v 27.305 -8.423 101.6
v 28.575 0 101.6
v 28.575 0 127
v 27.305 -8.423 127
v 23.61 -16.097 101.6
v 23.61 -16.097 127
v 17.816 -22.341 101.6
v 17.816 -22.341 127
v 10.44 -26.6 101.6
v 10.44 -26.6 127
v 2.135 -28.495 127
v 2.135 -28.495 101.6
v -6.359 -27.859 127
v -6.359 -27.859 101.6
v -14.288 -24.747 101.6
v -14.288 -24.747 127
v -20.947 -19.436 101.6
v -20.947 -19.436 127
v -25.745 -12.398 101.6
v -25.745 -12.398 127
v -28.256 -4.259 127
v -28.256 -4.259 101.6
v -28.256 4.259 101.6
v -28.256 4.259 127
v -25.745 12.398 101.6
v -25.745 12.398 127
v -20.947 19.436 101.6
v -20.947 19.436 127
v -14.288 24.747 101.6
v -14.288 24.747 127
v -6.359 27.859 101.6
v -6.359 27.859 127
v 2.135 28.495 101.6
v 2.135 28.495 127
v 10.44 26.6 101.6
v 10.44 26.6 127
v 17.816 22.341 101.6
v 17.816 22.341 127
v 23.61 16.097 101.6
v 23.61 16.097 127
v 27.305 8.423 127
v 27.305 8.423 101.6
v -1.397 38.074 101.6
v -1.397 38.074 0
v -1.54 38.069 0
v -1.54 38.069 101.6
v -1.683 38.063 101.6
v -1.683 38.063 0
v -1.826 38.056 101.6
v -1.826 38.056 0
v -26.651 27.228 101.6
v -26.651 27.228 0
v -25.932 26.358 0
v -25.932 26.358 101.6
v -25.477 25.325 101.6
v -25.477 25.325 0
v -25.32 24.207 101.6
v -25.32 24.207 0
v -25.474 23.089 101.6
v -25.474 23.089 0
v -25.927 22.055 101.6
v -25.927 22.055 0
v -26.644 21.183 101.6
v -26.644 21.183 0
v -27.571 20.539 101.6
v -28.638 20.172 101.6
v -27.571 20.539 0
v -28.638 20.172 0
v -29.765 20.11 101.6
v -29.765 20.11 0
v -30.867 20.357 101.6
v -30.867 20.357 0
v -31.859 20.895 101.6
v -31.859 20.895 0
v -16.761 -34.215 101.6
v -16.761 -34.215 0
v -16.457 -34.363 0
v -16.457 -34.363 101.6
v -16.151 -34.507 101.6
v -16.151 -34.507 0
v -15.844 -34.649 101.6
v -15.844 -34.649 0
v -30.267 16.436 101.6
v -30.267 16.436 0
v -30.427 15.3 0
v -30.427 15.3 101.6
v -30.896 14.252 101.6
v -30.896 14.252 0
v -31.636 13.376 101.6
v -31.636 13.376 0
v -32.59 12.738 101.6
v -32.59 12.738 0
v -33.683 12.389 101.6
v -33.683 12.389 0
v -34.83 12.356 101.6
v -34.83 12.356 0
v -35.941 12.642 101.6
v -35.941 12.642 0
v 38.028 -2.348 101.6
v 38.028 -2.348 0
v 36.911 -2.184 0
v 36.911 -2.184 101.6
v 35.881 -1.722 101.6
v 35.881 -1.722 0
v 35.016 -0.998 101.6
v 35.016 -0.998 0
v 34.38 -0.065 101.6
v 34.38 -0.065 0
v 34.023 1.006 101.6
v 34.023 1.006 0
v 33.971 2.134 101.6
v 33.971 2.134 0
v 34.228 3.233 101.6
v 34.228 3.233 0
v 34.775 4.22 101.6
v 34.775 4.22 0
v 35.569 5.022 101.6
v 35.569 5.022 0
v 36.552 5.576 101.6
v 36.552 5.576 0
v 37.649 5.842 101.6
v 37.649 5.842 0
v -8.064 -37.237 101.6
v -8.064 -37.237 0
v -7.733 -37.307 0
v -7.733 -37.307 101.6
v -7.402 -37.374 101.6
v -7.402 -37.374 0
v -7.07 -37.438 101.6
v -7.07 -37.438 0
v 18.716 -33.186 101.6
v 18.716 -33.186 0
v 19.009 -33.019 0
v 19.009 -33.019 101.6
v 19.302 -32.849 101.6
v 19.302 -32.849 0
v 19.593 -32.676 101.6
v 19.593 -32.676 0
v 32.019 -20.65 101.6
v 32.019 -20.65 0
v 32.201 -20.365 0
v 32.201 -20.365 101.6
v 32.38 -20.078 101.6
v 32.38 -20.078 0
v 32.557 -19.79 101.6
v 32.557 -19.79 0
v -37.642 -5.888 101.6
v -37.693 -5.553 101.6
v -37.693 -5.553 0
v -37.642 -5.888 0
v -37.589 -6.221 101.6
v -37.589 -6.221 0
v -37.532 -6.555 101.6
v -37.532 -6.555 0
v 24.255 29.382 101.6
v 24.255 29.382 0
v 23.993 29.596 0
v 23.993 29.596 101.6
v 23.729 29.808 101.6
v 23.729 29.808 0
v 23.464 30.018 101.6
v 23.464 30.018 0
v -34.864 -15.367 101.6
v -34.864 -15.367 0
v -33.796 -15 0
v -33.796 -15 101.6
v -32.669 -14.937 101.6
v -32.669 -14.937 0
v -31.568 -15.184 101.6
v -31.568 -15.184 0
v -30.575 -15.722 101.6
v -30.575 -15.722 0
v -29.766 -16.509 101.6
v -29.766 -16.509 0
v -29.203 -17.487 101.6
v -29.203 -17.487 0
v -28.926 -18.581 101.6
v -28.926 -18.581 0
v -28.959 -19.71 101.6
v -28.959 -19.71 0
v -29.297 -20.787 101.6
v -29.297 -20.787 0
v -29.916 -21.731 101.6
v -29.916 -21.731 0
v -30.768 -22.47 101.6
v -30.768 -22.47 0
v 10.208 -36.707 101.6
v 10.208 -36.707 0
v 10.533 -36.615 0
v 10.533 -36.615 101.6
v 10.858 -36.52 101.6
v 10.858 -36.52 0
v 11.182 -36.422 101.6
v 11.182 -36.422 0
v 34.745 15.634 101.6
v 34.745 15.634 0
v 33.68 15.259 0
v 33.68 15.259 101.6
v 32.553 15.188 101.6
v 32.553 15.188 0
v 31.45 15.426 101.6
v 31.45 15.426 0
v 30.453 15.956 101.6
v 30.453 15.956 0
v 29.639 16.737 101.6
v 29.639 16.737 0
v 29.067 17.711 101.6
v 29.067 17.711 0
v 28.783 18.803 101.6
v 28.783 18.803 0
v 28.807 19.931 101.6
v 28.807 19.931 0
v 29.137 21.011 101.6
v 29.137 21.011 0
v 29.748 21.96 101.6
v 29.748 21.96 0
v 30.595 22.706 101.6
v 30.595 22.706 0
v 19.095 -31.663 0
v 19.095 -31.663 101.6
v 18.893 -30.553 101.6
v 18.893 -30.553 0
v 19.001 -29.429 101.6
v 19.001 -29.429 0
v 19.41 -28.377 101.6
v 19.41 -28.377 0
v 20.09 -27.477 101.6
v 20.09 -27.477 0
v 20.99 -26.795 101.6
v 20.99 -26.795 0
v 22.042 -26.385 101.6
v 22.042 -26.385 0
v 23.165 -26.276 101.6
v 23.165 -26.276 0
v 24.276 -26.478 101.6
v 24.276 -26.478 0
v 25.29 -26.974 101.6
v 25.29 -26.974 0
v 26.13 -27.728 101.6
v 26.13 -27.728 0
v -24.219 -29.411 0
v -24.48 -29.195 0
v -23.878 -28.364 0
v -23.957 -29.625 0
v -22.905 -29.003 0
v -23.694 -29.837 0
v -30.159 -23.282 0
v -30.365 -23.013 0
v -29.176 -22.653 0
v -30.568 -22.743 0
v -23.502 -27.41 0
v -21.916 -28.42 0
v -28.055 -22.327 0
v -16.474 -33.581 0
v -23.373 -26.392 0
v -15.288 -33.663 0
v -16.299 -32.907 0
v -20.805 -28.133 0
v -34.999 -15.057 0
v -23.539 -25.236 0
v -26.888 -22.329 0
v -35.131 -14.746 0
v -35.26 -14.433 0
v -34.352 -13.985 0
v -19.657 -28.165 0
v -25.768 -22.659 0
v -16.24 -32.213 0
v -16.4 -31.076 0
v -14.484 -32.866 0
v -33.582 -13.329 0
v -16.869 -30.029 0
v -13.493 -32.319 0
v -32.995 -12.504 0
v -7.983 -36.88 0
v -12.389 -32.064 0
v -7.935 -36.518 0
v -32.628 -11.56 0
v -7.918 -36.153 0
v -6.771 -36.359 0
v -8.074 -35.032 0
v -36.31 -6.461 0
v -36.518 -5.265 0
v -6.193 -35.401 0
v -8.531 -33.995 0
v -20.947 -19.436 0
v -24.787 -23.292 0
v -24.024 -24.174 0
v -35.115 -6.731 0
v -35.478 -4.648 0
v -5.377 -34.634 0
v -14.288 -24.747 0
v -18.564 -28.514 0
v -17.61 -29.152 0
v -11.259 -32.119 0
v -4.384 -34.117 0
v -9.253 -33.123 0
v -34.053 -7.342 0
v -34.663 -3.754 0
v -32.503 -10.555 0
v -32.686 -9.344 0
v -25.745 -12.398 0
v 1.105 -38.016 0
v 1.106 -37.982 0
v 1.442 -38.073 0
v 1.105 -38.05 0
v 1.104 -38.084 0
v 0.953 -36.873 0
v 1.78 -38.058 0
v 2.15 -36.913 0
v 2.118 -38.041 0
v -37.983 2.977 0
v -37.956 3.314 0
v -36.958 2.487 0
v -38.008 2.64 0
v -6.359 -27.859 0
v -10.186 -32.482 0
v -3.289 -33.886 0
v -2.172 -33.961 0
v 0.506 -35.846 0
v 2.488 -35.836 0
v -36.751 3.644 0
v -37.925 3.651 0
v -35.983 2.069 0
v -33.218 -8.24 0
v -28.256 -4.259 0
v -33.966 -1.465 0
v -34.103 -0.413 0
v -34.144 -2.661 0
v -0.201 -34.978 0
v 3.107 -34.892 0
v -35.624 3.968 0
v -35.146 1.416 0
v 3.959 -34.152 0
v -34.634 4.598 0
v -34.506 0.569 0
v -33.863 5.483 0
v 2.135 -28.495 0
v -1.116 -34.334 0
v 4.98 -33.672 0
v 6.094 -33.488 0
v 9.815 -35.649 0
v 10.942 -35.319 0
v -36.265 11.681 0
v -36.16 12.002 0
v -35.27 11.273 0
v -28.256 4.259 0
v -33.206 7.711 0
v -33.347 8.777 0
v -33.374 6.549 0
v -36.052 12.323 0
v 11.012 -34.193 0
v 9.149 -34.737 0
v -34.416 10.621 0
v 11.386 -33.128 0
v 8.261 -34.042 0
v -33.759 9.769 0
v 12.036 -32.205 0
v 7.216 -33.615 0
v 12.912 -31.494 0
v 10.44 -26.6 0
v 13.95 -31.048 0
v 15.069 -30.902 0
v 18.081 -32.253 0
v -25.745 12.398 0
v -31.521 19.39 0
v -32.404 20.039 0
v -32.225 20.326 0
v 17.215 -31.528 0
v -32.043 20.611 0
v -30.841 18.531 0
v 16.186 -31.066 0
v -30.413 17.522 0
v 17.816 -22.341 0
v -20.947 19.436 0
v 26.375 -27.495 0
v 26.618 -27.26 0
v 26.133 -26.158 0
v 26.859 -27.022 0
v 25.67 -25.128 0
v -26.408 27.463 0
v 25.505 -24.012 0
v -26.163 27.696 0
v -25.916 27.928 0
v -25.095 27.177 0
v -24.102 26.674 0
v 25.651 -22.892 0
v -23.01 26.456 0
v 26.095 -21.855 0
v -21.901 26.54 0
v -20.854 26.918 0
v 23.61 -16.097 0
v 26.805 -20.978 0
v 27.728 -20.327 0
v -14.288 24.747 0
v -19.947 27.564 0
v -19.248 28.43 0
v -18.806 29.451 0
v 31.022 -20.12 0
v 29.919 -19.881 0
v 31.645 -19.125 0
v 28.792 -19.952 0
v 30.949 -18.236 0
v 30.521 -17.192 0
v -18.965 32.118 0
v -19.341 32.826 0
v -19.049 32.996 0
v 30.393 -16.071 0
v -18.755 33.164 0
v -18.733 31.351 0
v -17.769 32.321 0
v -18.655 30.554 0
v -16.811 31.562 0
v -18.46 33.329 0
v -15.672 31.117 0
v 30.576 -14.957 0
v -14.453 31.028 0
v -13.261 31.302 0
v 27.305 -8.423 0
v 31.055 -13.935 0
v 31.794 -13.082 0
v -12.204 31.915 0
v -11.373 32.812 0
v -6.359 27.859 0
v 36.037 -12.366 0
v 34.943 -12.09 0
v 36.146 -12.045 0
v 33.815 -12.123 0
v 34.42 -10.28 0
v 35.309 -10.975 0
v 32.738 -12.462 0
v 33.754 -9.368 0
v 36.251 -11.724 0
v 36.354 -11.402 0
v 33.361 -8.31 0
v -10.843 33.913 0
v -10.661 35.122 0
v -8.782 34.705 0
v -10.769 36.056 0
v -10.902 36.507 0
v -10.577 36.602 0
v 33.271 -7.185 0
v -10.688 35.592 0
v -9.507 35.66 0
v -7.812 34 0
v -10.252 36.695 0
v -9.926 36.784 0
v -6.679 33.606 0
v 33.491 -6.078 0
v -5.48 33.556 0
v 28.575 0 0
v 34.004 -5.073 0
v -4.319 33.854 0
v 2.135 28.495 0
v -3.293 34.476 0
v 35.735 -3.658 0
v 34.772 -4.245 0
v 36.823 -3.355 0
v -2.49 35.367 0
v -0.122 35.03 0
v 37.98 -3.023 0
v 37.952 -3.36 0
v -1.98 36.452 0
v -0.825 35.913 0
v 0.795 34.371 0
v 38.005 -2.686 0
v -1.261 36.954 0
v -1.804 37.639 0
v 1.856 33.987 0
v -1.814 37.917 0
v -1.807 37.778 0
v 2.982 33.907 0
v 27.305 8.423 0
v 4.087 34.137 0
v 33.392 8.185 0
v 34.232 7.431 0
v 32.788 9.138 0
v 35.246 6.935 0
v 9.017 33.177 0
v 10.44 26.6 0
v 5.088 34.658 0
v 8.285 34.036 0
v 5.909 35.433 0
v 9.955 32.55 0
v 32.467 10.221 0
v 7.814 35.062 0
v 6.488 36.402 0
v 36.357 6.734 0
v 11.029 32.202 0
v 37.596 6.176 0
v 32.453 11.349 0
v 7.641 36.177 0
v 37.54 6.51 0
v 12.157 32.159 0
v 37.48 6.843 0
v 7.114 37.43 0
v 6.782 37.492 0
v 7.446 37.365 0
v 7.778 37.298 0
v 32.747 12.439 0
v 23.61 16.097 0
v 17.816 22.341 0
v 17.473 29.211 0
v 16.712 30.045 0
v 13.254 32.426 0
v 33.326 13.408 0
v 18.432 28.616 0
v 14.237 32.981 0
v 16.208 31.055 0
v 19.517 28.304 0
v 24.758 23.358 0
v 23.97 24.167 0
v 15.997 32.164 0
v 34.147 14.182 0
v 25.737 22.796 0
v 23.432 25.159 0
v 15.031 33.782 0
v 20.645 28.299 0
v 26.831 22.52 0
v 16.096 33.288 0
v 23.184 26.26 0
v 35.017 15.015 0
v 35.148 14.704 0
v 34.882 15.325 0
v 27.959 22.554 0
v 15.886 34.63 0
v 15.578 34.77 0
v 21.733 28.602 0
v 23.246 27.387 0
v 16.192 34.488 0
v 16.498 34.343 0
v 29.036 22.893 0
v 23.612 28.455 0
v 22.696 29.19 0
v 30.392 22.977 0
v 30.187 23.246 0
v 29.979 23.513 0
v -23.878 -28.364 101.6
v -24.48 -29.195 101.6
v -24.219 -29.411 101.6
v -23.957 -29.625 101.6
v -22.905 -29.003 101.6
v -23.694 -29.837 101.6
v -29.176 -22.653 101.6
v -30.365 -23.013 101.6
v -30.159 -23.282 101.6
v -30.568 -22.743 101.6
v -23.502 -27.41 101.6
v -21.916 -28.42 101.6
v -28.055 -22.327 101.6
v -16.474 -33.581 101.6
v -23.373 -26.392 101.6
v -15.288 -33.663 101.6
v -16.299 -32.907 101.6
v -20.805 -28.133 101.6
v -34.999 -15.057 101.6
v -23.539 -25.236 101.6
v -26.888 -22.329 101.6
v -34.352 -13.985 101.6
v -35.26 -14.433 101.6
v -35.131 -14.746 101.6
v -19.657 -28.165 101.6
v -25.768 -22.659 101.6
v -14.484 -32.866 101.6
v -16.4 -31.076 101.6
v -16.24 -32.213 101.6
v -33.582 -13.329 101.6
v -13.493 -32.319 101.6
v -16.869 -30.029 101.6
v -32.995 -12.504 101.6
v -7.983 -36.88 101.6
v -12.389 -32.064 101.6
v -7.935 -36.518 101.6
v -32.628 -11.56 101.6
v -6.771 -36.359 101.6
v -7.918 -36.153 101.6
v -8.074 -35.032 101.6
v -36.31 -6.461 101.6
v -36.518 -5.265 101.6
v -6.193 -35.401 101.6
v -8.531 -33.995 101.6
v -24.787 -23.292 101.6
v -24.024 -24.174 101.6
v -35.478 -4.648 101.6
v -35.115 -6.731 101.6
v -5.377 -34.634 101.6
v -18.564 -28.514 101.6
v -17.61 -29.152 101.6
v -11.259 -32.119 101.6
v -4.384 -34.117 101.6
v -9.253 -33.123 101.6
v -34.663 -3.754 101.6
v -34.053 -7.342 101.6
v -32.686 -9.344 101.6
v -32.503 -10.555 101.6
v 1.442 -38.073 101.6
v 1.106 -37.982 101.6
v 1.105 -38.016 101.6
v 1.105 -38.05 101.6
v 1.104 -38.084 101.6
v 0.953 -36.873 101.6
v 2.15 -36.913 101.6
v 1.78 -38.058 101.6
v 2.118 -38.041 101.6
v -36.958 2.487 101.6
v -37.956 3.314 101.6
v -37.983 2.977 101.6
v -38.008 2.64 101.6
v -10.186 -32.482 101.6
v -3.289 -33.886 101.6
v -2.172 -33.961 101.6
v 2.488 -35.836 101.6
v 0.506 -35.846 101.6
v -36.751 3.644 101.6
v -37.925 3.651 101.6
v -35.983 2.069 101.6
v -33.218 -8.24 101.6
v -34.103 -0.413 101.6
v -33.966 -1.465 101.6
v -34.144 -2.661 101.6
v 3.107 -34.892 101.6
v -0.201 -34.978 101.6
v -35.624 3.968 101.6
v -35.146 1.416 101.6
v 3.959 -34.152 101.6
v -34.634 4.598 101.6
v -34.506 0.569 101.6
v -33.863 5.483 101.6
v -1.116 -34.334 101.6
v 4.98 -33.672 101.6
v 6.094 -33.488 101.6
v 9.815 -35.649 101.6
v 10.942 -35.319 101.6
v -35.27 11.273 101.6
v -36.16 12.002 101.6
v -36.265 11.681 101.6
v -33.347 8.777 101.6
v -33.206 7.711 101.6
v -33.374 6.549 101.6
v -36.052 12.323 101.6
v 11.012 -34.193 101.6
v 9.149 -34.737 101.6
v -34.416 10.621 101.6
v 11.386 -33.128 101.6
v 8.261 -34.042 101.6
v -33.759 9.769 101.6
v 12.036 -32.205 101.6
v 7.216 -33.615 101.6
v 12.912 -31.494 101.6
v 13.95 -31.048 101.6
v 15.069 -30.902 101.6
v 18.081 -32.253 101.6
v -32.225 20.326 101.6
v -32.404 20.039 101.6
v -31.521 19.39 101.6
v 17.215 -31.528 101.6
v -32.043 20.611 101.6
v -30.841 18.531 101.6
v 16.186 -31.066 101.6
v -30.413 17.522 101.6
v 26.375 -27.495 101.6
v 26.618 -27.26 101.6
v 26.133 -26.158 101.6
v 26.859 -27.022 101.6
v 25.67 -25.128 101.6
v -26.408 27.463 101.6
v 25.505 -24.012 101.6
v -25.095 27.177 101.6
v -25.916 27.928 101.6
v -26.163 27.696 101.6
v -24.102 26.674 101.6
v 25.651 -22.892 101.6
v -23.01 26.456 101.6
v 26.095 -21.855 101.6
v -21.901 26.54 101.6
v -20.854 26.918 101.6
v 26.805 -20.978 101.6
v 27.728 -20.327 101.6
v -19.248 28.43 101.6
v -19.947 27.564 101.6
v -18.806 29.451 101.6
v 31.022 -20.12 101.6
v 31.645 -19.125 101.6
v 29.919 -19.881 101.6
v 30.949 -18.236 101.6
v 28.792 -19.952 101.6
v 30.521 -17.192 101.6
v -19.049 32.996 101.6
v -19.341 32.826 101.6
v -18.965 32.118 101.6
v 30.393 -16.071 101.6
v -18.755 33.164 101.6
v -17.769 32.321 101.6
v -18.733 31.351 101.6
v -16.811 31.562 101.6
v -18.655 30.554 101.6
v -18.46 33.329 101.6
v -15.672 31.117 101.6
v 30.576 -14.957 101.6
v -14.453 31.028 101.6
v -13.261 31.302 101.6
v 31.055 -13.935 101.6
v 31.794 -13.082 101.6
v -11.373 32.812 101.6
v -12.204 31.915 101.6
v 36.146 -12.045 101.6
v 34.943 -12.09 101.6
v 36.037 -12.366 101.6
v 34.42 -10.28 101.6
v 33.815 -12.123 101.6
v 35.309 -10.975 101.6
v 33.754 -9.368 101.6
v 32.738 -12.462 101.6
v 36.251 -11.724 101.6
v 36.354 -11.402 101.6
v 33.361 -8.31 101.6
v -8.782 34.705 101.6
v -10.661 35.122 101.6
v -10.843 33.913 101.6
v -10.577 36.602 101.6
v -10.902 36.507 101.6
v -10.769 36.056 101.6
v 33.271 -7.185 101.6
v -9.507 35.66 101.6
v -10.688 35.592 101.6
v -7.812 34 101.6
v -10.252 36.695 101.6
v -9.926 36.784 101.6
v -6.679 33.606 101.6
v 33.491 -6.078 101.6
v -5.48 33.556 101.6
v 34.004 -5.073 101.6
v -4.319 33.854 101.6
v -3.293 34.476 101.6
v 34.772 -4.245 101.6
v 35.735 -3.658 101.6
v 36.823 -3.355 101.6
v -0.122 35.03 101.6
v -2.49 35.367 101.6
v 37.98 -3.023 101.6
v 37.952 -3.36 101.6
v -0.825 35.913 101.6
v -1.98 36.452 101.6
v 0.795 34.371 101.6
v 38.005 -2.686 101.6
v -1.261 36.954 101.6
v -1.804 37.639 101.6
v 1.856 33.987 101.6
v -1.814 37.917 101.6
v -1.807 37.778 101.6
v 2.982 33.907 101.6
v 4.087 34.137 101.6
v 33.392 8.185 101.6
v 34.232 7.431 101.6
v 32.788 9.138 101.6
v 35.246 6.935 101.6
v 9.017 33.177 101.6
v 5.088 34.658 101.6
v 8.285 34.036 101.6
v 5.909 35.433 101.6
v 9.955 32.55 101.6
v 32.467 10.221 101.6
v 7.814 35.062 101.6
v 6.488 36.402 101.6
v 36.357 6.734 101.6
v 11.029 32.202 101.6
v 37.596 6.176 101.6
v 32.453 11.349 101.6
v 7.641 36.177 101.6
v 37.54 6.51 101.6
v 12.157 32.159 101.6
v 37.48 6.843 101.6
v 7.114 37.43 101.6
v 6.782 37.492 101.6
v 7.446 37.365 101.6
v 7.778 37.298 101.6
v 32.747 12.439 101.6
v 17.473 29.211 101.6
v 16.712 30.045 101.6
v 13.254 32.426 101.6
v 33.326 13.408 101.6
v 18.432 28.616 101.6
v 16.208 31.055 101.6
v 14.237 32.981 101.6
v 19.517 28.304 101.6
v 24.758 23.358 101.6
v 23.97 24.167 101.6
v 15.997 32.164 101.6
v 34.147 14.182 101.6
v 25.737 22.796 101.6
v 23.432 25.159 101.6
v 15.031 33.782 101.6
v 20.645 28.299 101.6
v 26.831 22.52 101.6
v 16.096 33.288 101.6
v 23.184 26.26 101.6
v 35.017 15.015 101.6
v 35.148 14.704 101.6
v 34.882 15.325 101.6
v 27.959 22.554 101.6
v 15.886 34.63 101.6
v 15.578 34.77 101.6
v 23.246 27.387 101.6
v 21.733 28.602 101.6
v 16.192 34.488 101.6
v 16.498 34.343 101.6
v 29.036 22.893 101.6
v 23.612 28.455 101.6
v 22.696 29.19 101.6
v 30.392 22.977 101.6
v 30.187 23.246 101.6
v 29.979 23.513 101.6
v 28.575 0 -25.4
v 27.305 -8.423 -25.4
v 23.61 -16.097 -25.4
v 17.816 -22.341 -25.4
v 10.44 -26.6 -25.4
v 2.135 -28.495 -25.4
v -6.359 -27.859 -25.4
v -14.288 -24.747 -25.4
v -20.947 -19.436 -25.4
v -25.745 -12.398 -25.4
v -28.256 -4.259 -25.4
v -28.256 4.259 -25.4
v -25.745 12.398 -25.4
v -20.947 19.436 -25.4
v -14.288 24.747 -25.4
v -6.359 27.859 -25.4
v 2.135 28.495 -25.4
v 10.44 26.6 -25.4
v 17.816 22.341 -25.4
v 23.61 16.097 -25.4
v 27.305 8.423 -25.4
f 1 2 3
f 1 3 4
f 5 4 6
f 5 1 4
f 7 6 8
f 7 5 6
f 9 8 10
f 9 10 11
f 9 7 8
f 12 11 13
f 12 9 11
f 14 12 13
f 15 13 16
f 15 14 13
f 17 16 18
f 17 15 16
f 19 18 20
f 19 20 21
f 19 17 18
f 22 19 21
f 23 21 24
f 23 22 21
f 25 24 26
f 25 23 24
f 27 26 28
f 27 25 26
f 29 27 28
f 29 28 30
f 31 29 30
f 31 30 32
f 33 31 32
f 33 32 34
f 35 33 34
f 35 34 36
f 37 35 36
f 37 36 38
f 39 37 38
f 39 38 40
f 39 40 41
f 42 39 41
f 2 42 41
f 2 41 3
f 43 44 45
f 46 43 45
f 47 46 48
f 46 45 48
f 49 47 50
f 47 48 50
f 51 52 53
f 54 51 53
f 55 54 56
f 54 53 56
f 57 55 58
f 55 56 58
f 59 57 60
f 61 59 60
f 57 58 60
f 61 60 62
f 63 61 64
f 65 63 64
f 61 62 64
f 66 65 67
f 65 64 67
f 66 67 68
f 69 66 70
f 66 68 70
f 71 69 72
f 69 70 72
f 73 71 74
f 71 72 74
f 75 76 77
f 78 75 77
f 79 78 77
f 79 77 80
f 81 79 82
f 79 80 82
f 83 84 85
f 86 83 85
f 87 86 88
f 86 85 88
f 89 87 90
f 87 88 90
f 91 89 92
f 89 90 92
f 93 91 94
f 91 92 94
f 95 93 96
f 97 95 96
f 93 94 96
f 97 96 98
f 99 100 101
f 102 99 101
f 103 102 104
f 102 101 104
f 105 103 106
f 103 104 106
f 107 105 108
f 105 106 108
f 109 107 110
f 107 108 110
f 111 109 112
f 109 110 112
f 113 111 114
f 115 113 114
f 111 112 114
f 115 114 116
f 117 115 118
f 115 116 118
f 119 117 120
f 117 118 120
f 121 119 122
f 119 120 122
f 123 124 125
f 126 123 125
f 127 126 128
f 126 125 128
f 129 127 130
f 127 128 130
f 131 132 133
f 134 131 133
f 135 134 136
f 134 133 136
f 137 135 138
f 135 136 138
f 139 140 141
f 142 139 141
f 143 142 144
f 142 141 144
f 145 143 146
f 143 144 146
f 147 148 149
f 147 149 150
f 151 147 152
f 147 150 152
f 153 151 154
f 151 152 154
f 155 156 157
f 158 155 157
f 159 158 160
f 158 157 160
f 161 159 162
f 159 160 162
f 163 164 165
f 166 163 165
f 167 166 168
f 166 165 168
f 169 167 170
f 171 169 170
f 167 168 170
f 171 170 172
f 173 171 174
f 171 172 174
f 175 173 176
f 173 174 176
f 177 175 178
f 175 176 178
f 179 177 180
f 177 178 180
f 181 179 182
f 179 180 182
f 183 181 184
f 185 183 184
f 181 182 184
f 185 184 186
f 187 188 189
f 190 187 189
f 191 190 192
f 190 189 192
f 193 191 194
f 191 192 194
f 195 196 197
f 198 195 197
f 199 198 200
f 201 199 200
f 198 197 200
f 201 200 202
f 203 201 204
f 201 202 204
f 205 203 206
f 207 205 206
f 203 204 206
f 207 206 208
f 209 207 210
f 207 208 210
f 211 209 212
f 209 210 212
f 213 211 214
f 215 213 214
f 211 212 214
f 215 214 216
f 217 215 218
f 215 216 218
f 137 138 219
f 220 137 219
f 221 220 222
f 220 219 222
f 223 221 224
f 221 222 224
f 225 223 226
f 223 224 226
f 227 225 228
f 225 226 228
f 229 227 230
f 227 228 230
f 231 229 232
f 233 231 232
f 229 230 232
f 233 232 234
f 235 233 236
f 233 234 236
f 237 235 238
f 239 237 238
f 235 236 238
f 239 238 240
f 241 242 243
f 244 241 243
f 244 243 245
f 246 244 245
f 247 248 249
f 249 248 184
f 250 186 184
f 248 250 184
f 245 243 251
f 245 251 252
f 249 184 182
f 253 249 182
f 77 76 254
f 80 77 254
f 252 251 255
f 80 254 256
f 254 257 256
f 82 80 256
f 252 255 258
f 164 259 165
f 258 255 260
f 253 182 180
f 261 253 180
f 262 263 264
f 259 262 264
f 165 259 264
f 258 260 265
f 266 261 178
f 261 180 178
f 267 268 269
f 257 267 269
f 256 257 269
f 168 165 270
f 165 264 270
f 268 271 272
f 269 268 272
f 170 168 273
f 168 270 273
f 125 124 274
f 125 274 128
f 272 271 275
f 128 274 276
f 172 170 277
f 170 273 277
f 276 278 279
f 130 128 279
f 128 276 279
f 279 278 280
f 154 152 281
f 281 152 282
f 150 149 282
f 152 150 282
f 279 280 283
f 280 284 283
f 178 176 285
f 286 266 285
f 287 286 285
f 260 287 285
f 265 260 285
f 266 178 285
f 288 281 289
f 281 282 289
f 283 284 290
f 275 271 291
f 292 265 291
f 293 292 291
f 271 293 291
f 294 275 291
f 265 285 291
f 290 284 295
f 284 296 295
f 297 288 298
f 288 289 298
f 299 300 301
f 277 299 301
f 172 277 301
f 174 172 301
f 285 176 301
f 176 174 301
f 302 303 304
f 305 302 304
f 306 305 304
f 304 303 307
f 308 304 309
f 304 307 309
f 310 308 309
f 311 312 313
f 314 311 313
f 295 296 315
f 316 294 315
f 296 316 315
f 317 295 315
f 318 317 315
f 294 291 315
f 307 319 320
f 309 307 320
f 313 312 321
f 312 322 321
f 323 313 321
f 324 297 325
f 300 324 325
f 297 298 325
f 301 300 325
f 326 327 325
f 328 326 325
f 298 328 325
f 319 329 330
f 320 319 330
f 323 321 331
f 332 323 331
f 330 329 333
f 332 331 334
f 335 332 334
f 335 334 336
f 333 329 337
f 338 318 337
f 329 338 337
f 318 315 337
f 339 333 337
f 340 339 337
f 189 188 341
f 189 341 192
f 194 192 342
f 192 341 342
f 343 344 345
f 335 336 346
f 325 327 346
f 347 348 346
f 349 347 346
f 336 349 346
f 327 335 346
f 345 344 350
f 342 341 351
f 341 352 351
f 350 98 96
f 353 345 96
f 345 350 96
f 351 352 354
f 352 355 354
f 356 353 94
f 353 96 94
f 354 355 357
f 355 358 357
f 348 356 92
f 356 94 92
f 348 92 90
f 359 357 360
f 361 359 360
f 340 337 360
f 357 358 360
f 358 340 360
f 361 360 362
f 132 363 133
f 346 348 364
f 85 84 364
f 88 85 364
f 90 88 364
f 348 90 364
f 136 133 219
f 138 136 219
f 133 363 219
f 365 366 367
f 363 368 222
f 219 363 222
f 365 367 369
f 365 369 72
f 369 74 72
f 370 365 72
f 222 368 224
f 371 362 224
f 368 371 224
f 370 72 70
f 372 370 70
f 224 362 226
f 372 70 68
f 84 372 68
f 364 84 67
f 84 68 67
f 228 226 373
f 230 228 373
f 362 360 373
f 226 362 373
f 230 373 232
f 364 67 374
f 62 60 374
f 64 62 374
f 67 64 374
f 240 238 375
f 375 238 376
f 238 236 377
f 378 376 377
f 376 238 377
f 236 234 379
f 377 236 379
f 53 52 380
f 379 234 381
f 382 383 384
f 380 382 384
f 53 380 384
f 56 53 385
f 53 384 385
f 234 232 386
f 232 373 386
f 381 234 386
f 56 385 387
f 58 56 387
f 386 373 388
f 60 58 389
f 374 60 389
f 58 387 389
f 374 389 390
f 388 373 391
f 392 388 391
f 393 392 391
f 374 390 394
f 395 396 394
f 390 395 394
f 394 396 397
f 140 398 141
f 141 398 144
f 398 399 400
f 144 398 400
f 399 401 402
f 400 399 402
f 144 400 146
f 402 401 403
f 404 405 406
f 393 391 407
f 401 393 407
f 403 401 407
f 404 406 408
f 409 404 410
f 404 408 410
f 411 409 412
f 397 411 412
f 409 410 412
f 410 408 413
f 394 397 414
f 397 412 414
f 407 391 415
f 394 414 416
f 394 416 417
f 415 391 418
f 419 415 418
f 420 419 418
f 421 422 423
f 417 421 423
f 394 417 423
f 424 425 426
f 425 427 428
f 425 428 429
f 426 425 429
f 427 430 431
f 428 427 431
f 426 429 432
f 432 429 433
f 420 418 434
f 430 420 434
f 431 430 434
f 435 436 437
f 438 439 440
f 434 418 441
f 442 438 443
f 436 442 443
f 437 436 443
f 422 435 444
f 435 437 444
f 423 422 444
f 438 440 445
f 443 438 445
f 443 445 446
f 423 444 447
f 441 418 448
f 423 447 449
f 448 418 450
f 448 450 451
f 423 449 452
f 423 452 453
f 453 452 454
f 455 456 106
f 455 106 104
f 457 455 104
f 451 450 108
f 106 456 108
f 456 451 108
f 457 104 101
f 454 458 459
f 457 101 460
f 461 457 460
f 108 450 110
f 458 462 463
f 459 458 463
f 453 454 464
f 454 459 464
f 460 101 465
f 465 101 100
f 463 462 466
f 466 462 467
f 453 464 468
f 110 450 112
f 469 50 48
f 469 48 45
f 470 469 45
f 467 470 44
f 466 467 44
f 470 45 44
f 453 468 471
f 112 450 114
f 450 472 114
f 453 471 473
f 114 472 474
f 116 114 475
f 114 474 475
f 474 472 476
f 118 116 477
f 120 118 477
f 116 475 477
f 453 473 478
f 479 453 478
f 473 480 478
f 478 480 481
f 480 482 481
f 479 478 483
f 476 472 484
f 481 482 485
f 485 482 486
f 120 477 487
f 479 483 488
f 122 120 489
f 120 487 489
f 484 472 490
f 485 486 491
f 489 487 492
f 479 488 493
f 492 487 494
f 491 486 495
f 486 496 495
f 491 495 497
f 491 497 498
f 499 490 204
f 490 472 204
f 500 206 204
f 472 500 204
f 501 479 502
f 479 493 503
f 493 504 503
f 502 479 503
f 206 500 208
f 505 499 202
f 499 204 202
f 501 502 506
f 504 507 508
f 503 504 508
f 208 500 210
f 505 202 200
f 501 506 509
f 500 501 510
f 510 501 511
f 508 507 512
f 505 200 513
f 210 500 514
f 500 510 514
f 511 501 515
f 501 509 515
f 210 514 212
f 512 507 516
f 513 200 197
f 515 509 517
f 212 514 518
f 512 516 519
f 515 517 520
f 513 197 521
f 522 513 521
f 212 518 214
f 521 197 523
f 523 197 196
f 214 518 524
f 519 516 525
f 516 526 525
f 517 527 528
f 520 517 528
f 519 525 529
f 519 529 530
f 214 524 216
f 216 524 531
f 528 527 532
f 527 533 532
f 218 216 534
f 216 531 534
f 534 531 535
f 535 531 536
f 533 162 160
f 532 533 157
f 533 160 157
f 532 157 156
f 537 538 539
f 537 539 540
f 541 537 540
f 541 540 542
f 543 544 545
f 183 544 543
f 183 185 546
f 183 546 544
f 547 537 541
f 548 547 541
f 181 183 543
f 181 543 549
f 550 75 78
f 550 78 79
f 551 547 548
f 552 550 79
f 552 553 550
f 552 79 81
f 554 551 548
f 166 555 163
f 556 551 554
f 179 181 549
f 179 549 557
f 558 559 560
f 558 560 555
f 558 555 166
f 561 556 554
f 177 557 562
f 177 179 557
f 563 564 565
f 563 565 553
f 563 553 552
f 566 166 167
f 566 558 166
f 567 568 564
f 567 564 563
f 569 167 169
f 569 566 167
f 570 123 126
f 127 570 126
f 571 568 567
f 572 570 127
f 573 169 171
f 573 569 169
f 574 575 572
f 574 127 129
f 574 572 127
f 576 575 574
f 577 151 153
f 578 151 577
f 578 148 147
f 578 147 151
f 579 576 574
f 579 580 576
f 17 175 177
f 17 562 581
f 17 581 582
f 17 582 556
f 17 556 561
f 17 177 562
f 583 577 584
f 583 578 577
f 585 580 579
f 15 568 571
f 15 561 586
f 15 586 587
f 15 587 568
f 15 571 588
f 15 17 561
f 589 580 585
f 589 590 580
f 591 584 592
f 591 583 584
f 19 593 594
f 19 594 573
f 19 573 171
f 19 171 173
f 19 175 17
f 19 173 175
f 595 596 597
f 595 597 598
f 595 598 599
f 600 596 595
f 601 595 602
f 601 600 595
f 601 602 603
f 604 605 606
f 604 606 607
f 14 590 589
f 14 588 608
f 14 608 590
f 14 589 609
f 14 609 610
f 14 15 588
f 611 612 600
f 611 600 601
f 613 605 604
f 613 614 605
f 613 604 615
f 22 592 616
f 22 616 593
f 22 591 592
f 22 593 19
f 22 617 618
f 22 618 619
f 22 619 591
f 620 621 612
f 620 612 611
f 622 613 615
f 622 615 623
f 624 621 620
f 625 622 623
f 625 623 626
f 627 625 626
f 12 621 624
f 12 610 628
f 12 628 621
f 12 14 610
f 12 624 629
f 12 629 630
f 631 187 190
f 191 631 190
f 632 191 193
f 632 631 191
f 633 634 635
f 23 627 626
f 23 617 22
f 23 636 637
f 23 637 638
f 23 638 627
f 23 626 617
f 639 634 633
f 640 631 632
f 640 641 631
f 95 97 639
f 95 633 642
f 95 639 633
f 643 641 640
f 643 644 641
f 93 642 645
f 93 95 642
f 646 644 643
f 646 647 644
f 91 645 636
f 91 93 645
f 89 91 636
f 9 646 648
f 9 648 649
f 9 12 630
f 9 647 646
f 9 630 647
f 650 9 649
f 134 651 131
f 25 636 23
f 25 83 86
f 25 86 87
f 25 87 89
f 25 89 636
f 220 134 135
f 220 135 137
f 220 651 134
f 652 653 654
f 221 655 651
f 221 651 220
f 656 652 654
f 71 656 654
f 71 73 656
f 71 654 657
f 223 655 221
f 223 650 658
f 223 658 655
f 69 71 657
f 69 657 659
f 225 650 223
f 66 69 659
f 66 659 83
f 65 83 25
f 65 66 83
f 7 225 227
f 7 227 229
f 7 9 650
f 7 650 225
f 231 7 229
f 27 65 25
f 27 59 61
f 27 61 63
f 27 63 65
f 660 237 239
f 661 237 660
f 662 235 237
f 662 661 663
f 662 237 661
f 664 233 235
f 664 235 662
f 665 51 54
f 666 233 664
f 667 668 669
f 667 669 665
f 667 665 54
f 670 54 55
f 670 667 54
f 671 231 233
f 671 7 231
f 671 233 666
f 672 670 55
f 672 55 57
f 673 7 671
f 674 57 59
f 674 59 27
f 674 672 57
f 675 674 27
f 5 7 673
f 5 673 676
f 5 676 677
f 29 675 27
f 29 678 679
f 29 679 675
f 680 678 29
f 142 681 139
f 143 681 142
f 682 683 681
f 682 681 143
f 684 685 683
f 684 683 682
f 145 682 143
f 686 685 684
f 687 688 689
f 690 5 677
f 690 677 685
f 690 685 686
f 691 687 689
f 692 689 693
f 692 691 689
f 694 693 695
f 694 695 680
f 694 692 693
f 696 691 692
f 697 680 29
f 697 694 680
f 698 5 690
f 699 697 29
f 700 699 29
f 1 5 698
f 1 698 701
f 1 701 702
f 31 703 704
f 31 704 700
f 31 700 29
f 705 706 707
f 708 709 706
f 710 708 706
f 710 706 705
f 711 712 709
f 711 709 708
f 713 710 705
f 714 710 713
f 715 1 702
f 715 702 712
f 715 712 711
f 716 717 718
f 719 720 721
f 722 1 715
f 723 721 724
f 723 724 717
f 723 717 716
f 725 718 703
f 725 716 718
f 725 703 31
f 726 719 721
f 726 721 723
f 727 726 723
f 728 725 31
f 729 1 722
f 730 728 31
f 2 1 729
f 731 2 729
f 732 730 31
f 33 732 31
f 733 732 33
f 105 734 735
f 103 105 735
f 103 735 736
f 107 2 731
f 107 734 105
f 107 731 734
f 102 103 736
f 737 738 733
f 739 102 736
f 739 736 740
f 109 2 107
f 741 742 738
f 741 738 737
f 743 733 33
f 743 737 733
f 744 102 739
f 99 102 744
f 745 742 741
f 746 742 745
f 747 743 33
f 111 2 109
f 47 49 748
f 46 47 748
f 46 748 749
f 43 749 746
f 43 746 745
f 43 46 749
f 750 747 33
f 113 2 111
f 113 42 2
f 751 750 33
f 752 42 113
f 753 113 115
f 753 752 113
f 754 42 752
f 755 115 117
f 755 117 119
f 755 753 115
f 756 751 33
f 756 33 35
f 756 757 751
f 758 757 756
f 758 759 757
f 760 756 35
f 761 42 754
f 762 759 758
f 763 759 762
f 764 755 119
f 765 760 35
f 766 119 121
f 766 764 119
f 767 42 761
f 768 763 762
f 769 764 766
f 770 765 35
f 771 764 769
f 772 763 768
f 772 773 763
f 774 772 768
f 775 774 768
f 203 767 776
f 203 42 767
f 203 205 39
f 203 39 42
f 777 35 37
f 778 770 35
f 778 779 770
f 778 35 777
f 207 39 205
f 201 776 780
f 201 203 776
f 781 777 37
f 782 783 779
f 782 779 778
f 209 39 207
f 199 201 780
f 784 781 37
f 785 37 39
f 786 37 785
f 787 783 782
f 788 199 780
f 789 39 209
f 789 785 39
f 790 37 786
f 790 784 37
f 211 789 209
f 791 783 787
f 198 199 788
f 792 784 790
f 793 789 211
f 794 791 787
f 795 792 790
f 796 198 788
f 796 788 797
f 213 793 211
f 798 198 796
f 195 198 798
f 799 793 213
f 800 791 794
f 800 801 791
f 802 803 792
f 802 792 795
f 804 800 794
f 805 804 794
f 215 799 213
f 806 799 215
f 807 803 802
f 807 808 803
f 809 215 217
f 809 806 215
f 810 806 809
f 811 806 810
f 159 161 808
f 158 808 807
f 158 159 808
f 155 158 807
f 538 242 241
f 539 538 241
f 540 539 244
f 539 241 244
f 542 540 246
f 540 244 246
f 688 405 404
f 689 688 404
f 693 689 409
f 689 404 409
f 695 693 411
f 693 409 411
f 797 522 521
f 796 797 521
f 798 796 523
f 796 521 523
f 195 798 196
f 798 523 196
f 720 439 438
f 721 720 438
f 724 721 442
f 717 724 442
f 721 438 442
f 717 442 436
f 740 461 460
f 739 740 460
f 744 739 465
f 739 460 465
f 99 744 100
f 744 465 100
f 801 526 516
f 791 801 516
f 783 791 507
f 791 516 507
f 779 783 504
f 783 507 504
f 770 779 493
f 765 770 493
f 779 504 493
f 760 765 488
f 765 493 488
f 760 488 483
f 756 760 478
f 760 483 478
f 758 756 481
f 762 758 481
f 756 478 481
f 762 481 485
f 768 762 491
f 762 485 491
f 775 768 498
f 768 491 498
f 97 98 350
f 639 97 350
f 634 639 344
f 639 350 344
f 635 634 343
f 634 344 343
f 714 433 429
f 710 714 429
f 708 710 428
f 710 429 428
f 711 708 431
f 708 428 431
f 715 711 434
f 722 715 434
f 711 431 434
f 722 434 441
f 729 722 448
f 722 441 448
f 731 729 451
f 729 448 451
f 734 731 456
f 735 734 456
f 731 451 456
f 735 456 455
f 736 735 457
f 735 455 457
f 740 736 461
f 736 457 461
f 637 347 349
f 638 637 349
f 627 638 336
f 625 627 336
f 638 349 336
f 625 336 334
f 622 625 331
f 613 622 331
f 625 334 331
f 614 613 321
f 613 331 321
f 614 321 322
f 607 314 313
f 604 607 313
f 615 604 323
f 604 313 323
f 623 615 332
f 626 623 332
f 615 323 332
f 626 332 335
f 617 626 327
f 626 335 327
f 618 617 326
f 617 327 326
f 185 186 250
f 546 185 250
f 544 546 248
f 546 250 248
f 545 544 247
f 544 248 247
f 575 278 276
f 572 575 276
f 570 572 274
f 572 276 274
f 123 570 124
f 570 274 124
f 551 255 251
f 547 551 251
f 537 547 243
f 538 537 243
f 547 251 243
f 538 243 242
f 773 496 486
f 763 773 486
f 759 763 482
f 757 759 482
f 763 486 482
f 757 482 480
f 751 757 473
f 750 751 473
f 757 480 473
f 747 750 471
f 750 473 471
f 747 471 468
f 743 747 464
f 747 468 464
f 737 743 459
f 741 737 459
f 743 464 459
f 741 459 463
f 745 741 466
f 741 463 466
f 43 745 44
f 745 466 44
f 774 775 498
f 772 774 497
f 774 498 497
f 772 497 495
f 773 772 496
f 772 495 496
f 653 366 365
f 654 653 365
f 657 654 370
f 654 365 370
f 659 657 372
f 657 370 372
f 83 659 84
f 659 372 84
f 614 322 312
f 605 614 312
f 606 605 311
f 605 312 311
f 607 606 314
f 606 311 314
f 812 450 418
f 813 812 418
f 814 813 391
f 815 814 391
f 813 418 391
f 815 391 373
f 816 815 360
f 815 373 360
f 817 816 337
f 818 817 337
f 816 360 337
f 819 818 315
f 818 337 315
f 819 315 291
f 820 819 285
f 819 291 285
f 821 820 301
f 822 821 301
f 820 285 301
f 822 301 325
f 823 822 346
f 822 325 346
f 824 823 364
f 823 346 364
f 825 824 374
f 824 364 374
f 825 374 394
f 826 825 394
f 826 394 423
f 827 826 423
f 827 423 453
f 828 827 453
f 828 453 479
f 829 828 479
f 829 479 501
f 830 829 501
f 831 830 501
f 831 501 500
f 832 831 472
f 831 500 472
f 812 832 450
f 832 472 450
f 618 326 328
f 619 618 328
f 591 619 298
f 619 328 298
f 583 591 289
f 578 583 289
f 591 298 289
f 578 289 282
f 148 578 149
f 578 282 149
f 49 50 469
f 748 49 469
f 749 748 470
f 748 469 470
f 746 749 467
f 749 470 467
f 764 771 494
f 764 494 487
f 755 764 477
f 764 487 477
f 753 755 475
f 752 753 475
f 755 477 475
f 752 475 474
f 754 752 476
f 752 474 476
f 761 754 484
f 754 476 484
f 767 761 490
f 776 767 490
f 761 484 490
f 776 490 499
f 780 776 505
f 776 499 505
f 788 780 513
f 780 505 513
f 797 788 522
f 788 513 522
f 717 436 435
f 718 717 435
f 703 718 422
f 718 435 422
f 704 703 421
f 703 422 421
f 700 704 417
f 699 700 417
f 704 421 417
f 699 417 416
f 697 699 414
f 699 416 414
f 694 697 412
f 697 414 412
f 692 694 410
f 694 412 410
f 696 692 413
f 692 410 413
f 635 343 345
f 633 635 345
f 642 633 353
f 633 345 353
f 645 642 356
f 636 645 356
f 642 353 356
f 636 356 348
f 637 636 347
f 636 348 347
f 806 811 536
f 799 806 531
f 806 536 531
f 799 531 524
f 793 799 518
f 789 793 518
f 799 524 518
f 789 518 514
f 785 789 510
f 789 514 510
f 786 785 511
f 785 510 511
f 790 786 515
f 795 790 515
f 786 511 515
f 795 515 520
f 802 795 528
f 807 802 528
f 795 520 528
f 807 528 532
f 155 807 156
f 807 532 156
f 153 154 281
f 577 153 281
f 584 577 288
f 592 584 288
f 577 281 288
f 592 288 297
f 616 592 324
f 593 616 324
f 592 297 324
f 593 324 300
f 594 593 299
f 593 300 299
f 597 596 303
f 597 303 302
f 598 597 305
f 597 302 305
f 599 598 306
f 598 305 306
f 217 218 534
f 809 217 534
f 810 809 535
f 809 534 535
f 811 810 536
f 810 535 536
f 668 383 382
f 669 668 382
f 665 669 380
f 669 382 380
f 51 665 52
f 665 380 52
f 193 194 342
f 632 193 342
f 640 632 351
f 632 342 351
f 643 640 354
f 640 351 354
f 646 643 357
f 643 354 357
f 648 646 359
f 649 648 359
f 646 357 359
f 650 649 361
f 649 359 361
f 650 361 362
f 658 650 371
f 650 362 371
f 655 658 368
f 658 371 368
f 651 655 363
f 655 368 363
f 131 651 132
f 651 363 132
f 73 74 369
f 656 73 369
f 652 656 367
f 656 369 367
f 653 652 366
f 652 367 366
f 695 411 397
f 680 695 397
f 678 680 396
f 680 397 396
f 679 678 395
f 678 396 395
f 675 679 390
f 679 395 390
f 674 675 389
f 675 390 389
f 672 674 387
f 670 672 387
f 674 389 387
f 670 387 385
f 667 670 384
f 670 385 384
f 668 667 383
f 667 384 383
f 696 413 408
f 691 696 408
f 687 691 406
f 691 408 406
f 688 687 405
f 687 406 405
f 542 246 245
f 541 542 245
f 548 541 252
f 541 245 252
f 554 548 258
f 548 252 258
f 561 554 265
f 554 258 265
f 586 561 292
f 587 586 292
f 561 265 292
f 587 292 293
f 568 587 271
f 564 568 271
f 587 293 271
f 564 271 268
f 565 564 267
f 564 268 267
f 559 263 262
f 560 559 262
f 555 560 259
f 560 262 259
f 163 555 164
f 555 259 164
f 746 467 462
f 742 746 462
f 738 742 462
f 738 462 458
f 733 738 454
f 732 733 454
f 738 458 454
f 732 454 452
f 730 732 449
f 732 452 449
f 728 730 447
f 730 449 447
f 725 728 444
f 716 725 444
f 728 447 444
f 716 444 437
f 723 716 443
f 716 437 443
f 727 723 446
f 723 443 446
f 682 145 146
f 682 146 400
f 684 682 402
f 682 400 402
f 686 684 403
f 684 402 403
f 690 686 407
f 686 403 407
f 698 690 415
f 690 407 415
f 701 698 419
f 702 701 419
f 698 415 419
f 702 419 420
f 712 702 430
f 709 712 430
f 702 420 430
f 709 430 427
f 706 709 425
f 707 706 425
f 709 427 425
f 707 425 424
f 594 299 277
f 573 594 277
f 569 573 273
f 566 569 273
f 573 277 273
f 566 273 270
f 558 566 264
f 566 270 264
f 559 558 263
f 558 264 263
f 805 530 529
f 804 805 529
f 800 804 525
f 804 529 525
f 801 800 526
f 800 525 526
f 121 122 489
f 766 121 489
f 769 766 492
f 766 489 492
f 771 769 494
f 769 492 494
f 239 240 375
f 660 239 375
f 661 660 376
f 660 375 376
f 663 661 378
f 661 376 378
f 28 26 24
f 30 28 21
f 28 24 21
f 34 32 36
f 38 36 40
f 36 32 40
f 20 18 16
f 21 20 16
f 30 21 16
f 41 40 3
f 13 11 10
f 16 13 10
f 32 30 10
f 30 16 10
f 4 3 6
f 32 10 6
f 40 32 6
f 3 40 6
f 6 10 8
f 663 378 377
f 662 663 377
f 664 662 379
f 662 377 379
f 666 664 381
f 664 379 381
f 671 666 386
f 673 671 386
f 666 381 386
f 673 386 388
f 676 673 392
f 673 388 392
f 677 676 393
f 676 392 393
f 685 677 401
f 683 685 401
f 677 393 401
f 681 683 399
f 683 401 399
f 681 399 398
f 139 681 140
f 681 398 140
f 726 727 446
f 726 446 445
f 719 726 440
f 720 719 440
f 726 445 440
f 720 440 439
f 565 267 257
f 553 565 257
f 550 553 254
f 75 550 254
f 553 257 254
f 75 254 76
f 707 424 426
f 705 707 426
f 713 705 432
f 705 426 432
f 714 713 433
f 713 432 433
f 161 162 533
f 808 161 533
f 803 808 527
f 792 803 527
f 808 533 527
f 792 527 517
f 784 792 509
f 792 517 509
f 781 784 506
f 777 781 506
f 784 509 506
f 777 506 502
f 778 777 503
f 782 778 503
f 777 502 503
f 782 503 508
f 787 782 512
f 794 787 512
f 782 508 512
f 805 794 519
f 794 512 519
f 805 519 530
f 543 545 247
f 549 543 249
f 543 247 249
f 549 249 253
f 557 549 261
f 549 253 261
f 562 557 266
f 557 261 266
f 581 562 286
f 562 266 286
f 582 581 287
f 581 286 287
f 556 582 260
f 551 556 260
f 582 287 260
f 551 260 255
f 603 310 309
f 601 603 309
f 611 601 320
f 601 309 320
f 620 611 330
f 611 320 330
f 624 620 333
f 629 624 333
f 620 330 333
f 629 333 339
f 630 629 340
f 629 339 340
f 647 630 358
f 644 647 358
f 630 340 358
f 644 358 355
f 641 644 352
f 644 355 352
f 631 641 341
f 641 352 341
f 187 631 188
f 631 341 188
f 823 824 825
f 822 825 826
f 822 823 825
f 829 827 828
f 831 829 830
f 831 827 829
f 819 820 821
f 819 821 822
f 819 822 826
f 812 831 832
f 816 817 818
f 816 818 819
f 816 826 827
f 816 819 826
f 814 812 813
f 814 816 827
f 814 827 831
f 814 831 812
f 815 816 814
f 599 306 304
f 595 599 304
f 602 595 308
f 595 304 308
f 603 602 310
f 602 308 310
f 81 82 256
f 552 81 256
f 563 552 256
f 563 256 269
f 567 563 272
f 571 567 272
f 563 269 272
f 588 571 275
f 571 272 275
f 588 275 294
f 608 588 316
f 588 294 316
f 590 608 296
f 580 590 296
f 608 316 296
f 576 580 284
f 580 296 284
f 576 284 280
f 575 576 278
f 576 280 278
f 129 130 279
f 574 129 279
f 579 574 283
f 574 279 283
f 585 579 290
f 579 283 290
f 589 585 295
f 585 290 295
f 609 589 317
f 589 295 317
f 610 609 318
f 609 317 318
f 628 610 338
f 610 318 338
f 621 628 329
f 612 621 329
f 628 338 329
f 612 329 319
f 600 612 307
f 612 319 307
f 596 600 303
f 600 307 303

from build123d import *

# Parameters (mm, degrees)
F2_DEPTH      = 101.6
F3_R          = 28.575
F4_DEPTH      = 25.4
F4_DEPTH_BACK = 127


# Not quite as in the source:
# - a variable given as a bare number and used for a length is read in inches; the dataset says mm whatever the document's units were


with BuildPart() as f2:
    # F1 (on Top) → F2 (new body)
    with BuildSketch(Plane.XY):
        with BuildLine():
            ThreePointArc((38.0275754542, -2.3480854065), (33.9582141815, 1.5680199369), (37.6493768268, 5.8424673345))
            ThreePointArc((37.6493768268, 5.8424673345), (37.5682491535, 6.3432369925), (37.4804611085, 6.8428820754))
            ThreePointArc((37.4804611085, 6.8428820754), (32.5904927394, 9.6684424763), (35.1484807634, 14.703547192))
            ThreePointArc((35.1484807634, 14.703547192), (34.949592771, 15.1702328637), (34.7445086614, 15.6342290466))
            ThreePointArc((34.7445086614, 15.6342290466), (29.3195046315, 17.2042333476), (30.5949329549, 22.705948064))
            ThreePointArc((30.5949329549, 22.705948064), (30.2898995917, 23.1112955656), (29.9794962155, 23.5125457292))
            ThreePointArc((29.9794962155, 23.5125457292), (24.3362737456, 23.7353065516), (24.254658063, 29.3823341865))
            ThreePointArc((24.254658063, 29.3823341865), (23.861293108, 29.7026714491), (23.4636978498, 30.0177428068))
            ThreePointArc((23.4636978498, 30.0177428068), (17.9318179962, 28.8802510423), (16.4979246183, 34.3428083198))
            ThreePointArc((16.4979246183, 34.3428083198), (16.0392003661, 34.5594278254), (15.5776325681, 34.7699203849))
            ThreePointArc((15.5776325681, 34.7699203849), (10.4801540403, 32.3386049206), (7.7777215434, 37.2976815311))
            ThreePointArc((7.7777215434, 37.2976815311), (7.2804272356, 37.3979328208), (6.7818422008, 37.4915539337))
            ThreePointArc((6.7818422008, 37.4915539337), (2.4164549121, 33.9084022415), (-1.3966961475, 38.0743908667))
            ThreePointArc((-1.3966961475, 38.0743908667), (-1.611243941, 38.0659151074), (-1.8257405619, 38.0562303887))
            ThreePointArc((-1.8257405619, 38.0562303887), (-1.8097889216, 37.8477980327), (-1.8044671093, 37.638823919))
            ThreePointArc((-1.8044671093, 37.638823919), (-5.4804796414, 33.5557575077), (-9.9257732847, 36.7843584245))
            ThreePointArc((-9.9257732847, 36.7843584245), (-10.4146635829, 36.648939718), (-10.901707494, 36.5070236217))
            ThreePointArc((-10.901707494, 36.5070236217), (-10.7216553993, 35.8248982817), (-10.661041443, 35.1220187156))
            ThreePointArc((-10.661041443, 35.1220187156), (-13.8468450451, 31.1207754191), (-18.4601131844, 33.3291797262))
            ThreePointArc((-18.4601131844, 33.3291797262), (-18.9022425388, 33.0804357137), (-19.3410207665, 32.8258269616))
            ThreePointArc((-19.3410207665, 32.8258269616), (-18.8304314471, 31.7405924789), (-18.6552519207, 30.5541071359))
            ThreePointArc((-18.6552519207, 30.5541071359), (-21.3643249191, 26.6933193437), (-25.9163927322, 27.9275954524))
            ThreePointArc((-25.9163927322, 27.9275954524), (-26.2859410341, 27.580052646), (-26.6508291737, 27.2276202478))
            ThreePointArc((-26.6508291737, 27.2276202478), (-25.6675808238, 25.8545575842), (-25.3202410927, 24.2018526781))
            ThreePointArc((-25.3202410927, 24.2018526781), (-27.5730476059, 20.5380946086), (-31.8591693457, 20.8950551232))
            ThreePointArc((-31.8591693457, 20.8950551232), (-32.1345551797, 20.4690098296), (-32.4042439666, 20.0393356415))
            ThreePointArc((-32.4042439666, 20.0393356415), (-30.8413491085, 18.5309299599), (-30.266777295, 16.4362234724))
            ThreePointArc((-30.266777295, 16.4362234724), (-32.090467362, 13.0231821609), (-35.9413881732, 12.6422551859))
            ThreePointArc((-35.9413881732, 12.6422551859), (-36.1065291595, 12.1625882135), (-36.2652689185, 11.6807649693))
            ThreePointArc((-36.2652689185, 11.6807649693), (-34.0595315808, 10.2167411474), (-33.2059855622, 7.7107279494))
            ThreePointArc((-33.2059855622, 7.7107279494), (-34.633997298, 4.5984165422), (-37.9246499035, 3.6511545708))
            ThreePointArc((-37.9246499035, 3.6511545708), (-37.9699019004, 3.1458782044), (-38.0084223177, 2.6400441138))
            ThreePointArc((-38.0084223177, 2.6400441138), (-35.1463921507, 1.415528136), (-33.9662177648, -1.4650698011))
            ThreePointArc((-33.9662177648, -1.4650698011), (-35.0377873736, -4.231044916), (-37.6931331536, -5.5531714423))
            ThreePointArc((-37.6931331536, -5.5531714423), (-37.6158534696, -6.0545493438), (-37.5319049742, -6.554853851))
            ThreePointArc((-37.5319049742, -6.554853851), (-34.0527474172, -7.3423365778), (-32.5030767644, -10.5553082894))
            ThreePointArc((-32.5030767644, -10.5553082894), (-33.2626635907, -12.9344157776), (-35.2603583731, -14.4331953289))
            ThreePointArc((-35.2603583731, -14.4331953289), (-35.0650600987, -14.9013945747), (-34.8635452362, -15.3669519932))
            ThreePointArc((-34.8635452362, -15.3669519932), (-30.8586295725, -15.530858571), (-28.9020091826, -19.029122639))
            ThreePointArc((-28.9020091826, -19.029122639), (-29.3986442237, -20.9865001474), (-30.7683982573, -22.4703286287))
            ThreePointArc((-30.7683982573, -22.4703286287), (-30.4664867033, -22.878006643), (-30.1591738296, -23.2816286783))
            ThreePointArc((-30.1591738296, -23.2816286783), (-25.7683757069, -22.6593523381), (-23.373315365, -26.3916468007))
            ThreePointArc((-23.373315365, -26.3916468007), (-23.6598827933, -27.8986118146), (-24.4795807808, -29.1952072231))
            ThreePointArc((-24.4795807808, -29.1952072231), (-24.0886874142, -29.5185558363), (-23.6935234304, -29.8366711859))
            ThreePointArc((-23.6935234304, -29.8366711859), (-19.0984337687, -28.3012799336), (-16.2398679583, -32.2129134548))
            ThreePointArc((-16.2398679583, -32.2129134548), (-16.3723301811, -33.2473835979), (-16.7611693897, -34.2151019389))
            ThreePointArc((-16.7611693897, -34.2151019389), (-16.3041221659, -34.4352377718), (-15.844184429, -34.649268676))
            ThreePointArc((-15.844184429, -34.649268676), (-11.2586011252, -32.1193105722), (-7.9182563272, -36.1529638633))
            ThreePointArc((-7.9182563272, -36.1529638633), (-7.9548339389, -36.6997804834), (-8.0639150202, -37.2368537144))
            ThreePointArc((-8.0639150202, -37.2368537144), (-7.567405243, -37.3409209566), (-7.0695538613, -37.4383681295))
            ThreePointArc((-7.0695538613, -37.4383681295), (-2.7277955027, -33.8851355215), (1.1055420333, -37.9817012719))
            ThreePointArc((1.1055420333, -37.9817012719), (1.105223389, -38.0328515683), (1.1042675055, -38.083993925))
            ThreePointArc((1.1042675055, -38.083993925), (1.611243941, -38.0659151074), (2.1179347234, -38.0410876883))
            ThreePointArc((2.1179347234, -38.0410876883), (5.5309497632, -33.5414309717), (10.2079614225, -36.707050053))
            ThreePointArc((10.2079614225, -36.707050053), (10.6957973741, -36.5678809686), (11.1817370971, -36.4222288649))
            ThreePointArc((11.1817370971, -36.4222288649), (13.4156740687, -31.2352154819), (18.7155160648, -33.1864348556))
            ThreePointArc((18.7155160648, -33.1864348556), (19.1557221841, -32.9343029015), (19.592532238, -32.6763321152))
            ThreePointArc((19.592532238, -32.6763321152), (20.5169304634, -27.1048807648), (26.1300949689, -27.7277503039))
            ThreePointArc((26.1300949689, -27.7277503039), (26.4969634631, -27.377379846), (26.8591343834, -27.0221557277))
            ThreePointArc((26.8591343834, -27.0221557277), (26.4200095201, -21.3916360729), (32.018690847, -20.6497805423))
            ThreePointArc((32.018690847, -20.6497805423), (32.2907967999, -20.2216330208), (32.5571780061, -19.7899004616))
            ThreePointArc((32.5571780061, -19.7899004616), (30.780174702, -14.4291317214), (36.0374129719, -12.3658750718))
            ThreePointArc((36.0374129719, -12.3658750718), (36.1988655471, -11.8849540641), (36.3539005248, -11.4019260055))
            ThreePointArc((36.3539005248, -11.4019260055), (33.3427947854, -6.6239740954), (37.9515702047, -3.3598093687))
            ThreePointArc((37.9515702047, -3.3598093687), (37.9929406615, -2.8542003943), (38.0275754542, -2.3480854065))
        make_face()
    extrude(amount=F2_DEPTH)

    # F3 (on face) → F4 (join, two sides)
    with BuildSketch(Plane(origin=(0, 0, 0), x_dir=(1, 0, 0), z_dir=(0, 0, -1))) as f4_sk:
        Circle(F3_R)
    extrude(amount=F4_DEPTH)
    extrude(f4_sk.sketch, amount=-F4_DEPTH_BACK)


solid = f2.part
